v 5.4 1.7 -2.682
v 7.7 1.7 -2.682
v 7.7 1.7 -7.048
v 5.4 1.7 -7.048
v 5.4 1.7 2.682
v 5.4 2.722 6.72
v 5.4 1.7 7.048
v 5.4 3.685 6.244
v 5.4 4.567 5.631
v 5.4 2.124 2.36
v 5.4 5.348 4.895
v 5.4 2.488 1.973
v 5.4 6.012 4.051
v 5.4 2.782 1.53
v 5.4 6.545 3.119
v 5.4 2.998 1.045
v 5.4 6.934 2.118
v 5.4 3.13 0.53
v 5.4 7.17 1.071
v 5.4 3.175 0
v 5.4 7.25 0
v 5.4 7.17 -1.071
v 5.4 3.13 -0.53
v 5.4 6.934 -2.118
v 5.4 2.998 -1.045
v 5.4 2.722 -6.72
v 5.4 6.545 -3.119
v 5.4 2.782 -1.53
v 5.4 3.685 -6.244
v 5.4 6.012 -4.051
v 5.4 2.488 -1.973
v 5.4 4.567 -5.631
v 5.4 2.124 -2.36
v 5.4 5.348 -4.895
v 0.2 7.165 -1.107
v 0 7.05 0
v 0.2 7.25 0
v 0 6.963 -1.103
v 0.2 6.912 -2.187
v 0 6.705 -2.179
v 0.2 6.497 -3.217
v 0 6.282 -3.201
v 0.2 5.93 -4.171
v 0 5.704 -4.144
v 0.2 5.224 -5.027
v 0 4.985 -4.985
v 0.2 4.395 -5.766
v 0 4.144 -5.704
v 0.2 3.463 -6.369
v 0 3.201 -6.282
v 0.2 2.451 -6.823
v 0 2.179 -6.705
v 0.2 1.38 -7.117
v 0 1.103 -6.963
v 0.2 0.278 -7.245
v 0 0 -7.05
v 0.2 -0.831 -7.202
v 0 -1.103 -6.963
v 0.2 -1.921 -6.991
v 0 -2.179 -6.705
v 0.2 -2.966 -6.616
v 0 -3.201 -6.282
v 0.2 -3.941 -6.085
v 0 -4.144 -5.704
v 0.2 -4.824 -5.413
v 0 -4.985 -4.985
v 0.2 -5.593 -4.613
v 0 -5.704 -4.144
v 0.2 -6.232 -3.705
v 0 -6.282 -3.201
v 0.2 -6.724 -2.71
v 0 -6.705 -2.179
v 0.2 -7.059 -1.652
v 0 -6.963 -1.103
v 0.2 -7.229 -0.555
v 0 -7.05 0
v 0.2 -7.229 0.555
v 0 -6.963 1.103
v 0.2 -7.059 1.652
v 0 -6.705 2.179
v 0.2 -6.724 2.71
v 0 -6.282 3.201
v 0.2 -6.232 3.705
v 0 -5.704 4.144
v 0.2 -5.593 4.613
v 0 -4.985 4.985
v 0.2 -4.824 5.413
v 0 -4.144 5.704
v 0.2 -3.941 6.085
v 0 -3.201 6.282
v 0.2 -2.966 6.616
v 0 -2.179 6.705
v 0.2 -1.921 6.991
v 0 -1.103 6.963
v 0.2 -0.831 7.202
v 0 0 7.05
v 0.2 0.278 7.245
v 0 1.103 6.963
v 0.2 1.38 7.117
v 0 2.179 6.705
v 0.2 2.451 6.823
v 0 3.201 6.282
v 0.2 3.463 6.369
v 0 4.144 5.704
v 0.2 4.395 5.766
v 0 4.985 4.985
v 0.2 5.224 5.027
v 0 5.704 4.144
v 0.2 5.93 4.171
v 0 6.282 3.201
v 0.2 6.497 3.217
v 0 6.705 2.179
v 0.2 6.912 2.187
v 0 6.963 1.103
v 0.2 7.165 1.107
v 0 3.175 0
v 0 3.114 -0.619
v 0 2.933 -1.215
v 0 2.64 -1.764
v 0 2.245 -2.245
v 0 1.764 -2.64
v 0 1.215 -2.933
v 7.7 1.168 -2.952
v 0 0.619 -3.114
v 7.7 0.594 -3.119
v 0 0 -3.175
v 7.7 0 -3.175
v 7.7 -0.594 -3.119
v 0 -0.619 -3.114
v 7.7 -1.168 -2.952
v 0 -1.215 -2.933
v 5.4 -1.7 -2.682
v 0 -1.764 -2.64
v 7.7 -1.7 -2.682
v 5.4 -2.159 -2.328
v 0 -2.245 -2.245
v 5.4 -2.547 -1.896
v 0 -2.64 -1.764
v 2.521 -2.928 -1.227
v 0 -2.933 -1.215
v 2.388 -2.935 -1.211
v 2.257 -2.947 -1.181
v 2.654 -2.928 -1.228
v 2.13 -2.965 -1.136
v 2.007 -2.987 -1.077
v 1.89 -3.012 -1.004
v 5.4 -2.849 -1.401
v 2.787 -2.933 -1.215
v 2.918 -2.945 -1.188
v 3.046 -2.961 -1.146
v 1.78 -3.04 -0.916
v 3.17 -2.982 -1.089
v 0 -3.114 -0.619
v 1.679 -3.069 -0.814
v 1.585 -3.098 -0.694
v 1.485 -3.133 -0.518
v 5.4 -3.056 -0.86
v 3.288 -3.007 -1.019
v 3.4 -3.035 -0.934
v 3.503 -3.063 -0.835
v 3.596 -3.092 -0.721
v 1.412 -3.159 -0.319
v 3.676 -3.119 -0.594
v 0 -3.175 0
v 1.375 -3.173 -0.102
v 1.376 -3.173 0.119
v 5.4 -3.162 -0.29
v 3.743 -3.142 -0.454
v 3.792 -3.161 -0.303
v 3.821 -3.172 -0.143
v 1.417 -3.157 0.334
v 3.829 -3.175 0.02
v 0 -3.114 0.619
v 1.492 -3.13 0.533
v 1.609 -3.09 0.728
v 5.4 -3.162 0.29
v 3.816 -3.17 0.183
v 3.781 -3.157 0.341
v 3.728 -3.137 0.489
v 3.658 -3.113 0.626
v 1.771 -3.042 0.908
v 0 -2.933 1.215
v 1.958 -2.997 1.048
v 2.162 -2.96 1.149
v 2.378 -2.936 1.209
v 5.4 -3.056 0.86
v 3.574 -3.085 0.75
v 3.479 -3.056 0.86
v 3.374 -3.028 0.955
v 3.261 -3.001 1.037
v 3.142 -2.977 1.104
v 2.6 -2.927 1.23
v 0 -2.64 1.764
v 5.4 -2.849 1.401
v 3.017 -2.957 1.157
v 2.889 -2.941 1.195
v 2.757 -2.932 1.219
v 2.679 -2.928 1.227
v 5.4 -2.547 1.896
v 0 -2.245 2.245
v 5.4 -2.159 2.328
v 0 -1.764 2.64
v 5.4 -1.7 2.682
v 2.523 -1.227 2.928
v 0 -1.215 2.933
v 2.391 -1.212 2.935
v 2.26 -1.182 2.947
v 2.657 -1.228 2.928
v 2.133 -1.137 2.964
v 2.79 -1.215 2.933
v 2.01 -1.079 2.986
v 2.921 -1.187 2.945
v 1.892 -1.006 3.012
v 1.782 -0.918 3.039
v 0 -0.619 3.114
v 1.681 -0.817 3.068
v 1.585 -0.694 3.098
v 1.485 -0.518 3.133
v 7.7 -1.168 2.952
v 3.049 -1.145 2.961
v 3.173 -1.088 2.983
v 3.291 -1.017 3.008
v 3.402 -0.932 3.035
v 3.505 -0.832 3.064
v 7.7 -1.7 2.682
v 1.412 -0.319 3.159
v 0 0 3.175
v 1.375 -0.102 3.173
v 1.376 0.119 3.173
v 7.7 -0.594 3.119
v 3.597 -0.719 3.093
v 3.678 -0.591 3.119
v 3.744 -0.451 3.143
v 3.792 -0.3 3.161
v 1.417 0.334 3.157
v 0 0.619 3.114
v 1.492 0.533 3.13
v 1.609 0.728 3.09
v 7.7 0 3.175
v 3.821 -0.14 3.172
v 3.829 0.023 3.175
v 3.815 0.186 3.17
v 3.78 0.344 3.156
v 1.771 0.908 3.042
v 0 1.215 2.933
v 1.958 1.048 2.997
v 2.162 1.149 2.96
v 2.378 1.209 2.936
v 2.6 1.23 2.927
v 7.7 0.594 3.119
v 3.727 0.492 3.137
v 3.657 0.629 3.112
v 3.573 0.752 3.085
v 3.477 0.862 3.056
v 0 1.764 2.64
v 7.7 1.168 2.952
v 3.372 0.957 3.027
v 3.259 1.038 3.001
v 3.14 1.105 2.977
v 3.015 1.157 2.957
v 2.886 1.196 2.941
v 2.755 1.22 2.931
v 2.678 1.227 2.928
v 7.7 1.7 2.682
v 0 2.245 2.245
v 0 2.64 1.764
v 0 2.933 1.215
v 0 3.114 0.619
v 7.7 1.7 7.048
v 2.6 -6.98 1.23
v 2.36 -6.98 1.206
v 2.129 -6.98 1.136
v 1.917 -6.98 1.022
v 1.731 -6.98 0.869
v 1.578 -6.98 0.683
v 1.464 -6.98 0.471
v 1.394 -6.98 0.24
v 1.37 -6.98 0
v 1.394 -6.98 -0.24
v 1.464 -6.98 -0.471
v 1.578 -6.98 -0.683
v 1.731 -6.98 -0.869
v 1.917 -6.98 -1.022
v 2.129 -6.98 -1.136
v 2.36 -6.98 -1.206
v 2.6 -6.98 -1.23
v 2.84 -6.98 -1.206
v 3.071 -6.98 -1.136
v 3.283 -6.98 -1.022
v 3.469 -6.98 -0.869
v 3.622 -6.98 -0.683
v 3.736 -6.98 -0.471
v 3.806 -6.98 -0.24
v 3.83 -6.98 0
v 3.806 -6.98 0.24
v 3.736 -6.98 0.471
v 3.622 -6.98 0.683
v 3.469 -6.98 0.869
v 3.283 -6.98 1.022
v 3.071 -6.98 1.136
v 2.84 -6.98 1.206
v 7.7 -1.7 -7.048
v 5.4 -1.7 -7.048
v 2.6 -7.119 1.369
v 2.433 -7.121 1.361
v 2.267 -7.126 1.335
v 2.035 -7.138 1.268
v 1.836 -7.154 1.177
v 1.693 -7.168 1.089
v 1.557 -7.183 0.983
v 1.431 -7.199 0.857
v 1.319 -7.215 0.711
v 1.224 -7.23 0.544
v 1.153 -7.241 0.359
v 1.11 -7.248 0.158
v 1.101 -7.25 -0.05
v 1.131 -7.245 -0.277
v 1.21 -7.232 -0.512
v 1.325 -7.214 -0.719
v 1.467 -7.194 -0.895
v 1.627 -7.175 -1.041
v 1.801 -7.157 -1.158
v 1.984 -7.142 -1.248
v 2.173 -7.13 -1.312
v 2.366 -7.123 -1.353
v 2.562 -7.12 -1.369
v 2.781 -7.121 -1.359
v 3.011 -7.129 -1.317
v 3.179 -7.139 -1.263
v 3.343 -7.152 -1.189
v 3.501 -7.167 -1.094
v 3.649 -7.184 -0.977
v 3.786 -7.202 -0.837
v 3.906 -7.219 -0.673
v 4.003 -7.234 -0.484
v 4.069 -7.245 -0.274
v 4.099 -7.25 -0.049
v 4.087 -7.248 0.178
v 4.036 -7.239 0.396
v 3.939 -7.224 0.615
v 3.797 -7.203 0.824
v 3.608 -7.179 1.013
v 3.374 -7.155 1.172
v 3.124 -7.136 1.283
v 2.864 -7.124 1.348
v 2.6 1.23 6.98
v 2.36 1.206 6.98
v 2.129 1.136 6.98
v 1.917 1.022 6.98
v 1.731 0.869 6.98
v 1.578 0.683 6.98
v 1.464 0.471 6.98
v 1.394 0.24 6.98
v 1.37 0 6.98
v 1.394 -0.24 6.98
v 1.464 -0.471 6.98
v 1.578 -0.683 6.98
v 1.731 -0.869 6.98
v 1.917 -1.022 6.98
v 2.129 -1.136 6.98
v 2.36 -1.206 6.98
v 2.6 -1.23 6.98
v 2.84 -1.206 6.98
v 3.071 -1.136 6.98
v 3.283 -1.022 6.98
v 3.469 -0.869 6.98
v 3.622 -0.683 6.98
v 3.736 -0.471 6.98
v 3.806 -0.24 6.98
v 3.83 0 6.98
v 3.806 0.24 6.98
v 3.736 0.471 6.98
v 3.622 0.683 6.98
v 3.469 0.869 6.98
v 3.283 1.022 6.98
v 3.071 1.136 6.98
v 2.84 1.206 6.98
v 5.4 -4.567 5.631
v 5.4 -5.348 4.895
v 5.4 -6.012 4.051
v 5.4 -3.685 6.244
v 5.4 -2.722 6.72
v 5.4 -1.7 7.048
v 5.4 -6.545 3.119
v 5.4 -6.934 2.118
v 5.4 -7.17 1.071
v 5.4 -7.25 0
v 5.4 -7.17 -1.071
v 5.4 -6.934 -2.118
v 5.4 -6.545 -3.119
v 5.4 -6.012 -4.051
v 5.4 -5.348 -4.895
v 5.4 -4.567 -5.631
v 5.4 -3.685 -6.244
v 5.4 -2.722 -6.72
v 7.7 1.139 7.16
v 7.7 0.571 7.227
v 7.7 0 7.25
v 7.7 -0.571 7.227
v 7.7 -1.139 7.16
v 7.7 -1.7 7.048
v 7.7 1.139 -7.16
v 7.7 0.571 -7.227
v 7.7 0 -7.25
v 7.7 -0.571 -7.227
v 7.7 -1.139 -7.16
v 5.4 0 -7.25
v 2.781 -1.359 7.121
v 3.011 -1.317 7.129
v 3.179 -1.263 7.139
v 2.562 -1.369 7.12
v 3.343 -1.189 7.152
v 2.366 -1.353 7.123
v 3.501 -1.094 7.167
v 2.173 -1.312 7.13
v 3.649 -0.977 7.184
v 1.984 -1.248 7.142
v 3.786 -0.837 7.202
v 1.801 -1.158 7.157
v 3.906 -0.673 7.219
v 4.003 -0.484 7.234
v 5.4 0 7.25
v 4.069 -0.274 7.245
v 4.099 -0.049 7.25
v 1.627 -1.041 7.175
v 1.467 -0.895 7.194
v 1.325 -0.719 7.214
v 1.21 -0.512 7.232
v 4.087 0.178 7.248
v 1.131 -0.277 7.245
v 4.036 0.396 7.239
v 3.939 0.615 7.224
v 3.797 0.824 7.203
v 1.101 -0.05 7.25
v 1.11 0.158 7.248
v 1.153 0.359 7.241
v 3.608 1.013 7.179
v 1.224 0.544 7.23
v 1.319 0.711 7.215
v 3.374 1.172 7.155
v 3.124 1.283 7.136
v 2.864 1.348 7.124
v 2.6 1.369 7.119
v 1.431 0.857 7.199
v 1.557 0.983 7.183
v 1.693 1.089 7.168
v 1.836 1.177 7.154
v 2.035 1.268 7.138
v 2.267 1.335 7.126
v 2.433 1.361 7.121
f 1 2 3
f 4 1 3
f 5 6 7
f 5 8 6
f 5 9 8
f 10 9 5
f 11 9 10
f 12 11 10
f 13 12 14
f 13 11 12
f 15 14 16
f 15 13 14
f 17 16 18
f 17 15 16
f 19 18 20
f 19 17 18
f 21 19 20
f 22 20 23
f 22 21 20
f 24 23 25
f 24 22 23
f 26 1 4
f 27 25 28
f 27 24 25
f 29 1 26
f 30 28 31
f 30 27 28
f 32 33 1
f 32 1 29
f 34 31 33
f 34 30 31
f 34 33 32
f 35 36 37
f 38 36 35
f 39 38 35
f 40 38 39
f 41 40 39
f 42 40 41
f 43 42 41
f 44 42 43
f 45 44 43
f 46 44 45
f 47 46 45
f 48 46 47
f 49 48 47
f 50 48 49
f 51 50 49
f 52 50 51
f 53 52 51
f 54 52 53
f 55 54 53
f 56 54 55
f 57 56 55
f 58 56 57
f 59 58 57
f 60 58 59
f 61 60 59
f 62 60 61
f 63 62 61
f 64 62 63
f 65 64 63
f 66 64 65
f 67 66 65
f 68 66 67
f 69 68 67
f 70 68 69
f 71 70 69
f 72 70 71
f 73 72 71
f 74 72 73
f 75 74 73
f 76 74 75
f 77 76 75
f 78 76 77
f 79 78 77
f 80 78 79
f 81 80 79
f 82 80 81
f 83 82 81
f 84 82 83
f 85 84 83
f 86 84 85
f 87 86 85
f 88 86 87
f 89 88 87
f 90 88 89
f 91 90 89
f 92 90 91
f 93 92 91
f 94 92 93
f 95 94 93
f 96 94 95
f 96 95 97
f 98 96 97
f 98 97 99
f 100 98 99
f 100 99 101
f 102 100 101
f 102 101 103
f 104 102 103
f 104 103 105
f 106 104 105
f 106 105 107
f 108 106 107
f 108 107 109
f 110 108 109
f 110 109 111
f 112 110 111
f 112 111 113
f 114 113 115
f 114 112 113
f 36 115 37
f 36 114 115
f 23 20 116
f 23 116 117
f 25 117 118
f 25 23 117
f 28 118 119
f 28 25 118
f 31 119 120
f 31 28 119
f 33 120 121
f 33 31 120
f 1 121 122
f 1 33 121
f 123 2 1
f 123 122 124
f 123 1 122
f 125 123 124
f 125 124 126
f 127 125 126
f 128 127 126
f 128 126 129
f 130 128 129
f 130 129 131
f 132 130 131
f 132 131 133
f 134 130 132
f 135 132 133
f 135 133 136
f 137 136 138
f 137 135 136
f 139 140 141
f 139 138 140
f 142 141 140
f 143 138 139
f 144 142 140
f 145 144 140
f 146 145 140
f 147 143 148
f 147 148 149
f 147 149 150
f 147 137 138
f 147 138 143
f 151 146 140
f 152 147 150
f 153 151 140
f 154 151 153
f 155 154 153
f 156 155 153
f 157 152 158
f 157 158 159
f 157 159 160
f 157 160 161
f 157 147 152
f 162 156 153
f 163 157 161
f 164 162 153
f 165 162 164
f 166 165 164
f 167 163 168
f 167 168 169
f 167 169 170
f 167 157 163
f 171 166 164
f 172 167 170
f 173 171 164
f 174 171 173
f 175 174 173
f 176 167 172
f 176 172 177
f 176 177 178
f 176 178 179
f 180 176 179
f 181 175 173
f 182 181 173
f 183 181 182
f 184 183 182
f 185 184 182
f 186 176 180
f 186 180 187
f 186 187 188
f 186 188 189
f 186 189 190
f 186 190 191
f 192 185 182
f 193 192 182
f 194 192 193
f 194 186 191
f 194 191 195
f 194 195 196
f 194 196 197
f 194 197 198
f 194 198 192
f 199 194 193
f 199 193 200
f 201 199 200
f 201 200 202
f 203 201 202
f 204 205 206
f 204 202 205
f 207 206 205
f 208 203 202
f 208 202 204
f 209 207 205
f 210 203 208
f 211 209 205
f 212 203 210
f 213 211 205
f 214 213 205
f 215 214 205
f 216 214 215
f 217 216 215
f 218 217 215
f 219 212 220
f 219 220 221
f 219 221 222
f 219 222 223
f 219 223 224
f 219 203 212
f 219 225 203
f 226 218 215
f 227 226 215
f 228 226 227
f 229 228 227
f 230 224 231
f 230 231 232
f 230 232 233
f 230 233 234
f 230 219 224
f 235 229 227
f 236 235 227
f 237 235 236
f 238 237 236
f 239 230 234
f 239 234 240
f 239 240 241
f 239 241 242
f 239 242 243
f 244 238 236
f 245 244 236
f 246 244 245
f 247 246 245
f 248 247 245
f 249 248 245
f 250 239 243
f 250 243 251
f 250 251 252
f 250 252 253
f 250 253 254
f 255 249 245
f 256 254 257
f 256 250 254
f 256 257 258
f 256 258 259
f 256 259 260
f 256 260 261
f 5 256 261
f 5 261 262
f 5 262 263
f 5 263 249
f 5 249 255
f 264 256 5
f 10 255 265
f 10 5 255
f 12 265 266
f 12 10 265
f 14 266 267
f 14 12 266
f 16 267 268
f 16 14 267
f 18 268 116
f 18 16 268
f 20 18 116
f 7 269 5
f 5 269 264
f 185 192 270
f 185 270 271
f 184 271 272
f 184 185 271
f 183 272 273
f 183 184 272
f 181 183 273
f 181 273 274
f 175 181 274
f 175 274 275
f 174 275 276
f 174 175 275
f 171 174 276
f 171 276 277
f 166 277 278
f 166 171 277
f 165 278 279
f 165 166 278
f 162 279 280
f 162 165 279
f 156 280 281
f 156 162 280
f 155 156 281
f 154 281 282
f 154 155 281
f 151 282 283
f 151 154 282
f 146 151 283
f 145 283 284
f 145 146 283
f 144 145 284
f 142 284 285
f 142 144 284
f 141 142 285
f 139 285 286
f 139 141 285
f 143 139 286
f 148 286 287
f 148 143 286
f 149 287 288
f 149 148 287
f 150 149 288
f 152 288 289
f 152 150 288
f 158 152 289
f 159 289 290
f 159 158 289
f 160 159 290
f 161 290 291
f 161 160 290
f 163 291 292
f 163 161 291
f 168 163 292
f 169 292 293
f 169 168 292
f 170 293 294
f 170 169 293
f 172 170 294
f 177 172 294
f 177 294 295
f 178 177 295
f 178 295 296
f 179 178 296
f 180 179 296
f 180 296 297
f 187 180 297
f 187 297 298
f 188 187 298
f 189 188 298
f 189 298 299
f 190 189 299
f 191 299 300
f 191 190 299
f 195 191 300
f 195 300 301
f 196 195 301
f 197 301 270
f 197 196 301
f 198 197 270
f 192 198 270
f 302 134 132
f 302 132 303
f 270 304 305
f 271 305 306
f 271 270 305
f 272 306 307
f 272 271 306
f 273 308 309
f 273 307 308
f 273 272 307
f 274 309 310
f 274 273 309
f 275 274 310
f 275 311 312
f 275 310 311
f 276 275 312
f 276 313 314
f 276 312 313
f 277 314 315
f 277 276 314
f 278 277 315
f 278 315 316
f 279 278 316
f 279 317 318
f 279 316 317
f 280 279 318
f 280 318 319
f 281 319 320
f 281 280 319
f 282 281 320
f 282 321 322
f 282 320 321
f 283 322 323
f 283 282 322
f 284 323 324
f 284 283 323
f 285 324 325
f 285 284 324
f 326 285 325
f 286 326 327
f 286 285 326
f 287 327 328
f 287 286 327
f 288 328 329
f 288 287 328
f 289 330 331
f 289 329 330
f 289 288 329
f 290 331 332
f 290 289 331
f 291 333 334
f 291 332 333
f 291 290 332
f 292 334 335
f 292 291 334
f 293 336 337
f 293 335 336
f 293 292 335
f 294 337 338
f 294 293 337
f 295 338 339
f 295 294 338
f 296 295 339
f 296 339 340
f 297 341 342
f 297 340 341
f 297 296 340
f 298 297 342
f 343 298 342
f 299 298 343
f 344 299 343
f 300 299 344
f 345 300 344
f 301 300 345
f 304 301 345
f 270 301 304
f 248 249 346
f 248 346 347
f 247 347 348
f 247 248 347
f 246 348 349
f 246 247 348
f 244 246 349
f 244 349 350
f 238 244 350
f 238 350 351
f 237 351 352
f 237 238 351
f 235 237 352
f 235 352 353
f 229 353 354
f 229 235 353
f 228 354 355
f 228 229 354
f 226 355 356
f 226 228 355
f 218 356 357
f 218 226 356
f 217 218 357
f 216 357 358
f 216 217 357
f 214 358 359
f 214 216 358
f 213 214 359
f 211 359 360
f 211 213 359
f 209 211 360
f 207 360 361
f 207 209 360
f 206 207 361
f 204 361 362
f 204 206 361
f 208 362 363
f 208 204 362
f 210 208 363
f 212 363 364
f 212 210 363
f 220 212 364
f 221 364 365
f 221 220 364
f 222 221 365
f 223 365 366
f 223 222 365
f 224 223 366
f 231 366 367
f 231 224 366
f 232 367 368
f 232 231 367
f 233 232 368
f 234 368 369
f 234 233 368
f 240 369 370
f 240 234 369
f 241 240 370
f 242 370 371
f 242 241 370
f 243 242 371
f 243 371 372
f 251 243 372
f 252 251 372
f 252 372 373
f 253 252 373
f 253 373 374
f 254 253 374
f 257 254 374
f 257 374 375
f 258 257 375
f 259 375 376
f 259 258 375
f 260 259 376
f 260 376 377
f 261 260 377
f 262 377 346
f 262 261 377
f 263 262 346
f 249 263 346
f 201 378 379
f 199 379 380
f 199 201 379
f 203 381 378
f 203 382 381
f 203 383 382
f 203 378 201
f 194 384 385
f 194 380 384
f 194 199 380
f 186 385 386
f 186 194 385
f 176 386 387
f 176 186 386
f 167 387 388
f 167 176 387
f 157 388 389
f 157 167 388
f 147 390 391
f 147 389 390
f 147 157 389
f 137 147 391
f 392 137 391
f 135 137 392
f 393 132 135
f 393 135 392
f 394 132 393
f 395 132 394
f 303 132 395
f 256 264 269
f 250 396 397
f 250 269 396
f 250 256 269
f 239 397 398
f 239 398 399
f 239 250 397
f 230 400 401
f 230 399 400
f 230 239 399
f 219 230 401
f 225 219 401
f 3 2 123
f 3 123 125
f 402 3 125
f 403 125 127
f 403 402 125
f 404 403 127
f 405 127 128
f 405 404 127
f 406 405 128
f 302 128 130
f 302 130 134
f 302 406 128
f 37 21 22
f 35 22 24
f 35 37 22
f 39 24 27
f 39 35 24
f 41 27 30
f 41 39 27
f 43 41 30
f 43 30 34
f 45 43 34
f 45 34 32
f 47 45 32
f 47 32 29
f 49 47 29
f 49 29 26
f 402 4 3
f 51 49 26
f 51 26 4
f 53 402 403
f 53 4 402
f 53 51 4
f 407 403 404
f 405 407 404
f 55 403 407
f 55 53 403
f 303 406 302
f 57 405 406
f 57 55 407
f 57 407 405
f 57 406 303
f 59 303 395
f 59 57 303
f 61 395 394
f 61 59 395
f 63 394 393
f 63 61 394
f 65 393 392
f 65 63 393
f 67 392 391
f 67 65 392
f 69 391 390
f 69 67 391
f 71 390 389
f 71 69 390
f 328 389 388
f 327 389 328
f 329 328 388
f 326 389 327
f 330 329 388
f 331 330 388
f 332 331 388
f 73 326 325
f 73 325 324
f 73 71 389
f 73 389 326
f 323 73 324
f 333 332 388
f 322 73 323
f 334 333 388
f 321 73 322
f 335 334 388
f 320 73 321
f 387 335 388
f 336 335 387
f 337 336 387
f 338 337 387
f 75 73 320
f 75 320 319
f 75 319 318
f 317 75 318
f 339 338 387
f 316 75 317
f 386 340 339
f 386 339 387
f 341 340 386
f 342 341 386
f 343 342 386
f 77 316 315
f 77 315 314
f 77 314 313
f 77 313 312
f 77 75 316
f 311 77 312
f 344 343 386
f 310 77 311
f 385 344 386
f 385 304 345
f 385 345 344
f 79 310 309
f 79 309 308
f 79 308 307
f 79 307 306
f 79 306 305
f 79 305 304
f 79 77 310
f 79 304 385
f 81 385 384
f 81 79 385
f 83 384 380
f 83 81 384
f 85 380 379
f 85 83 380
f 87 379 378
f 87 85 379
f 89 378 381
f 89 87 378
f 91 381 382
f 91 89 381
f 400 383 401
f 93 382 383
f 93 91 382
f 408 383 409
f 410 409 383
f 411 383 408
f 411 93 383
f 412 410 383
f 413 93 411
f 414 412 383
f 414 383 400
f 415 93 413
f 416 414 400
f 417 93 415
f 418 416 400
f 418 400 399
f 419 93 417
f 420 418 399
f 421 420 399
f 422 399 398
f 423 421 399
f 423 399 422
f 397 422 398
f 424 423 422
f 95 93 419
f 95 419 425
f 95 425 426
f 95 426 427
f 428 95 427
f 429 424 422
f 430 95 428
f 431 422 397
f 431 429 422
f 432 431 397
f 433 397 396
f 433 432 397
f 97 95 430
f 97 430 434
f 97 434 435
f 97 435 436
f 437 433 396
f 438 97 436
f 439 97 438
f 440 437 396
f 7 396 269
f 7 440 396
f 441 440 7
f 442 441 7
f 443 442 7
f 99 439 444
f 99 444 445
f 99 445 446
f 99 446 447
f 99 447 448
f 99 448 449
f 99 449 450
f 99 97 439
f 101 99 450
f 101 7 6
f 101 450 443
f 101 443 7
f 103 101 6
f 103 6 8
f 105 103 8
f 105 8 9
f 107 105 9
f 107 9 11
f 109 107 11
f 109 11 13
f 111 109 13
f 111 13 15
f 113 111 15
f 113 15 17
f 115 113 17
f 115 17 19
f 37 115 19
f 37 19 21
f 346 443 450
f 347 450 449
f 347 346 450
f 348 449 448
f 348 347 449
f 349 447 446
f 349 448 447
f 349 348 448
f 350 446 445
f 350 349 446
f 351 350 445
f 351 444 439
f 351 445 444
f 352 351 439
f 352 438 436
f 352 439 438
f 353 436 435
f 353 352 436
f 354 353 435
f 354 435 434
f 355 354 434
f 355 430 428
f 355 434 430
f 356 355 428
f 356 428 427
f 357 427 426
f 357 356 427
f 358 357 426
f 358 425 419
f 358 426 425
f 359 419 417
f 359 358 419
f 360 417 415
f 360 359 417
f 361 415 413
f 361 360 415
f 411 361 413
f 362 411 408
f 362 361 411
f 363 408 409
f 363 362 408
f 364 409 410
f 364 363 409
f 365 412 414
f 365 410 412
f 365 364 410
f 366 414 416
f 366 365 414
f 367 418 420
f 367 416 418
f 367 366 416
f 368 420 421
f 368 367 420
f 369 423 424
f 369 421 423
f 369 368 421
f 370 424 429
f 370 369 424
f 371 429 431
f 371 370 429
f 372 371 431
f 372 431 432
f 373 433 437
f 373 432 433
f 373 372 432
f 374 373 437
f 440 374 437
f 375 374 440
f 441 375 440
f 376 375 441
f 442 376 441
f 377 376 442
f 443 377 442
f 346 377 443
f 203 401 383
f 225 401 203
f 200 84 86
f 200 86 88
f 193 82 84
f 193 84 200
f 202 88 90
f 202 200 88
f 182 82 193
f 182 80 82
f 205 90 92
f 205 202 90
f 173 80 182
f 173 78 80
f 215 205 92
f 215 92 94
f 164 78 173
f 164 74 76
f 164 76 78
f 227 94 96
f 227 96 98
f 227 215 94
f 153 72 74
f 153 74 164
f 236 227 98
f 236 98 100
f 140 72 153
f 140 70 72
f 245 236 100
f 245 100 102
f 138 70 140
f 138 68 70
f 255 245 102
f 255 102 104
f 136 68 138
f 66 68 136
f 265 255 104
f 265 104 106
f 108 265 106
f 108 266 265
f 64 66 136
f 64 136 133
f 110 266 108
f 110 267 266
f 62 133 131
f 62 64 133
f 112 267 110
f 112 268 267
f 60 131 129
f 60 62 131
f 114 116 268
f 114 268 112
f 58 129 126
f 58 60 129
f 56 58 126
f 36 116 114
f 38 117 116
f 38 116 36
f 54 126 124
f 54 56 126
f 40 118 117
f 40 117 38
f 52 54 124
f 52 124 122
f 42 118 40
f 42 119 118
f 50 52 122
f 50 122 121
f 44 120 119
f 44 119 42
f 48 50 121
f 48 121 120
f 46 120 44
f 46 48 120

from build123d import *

# Parameters (mm, degrees)
SKETCH2_W          = 16.5
SKETCH2_H          = 15.5
SKETCH2_W_2        = 14.5
SKETCH2_H_2        = 3.4
CUT_EXTRUDE1_DEPTH = 2.3


with BuildPart() as part:
    # Sketch1 → Revolve1 (revolve)
    with BuildSketch(Plane.XY):
        Polygon((0, 7.05), (0, 3.175), (7.7, 3.175), (7.7, 7.25), (0.2, 7.25), align=None)
    revolve(axis=Axis((7.7, 0, 0), (-1, 0, 0)))

    # Sketch2 → Cut-Extrude1 (cut)
    with BuildSketch(Plane(origin=(7.7, 0, 0), x_dir=(0, 0, -1), z_dir=(1, 0, 0))):
        Rectangle(SKETCH2_W, SKETCH2_H)
        Rectangle(SKETCH2_W_2, SKETCH2_H_2, mode=Mode.SUBTRACT)
    extrude(amount=-CUT_EXTRUDE1_DEPTH, mode=Mode.SUBTRACT)

    # Sketch3 → Cut-Revolve1 (revolve, cut)
    with BuildSketch(Plane(origin=(2.6, 0, 0), x_dir=(0, 0, -1), z_dir=(1, 0, 0))):
        Polygon((-7.25, 0), (-7.25, 1.5), (-6.9795, 1.2295), (0, 1.2295), (0, 0), align=None)
    revolve(axis=Axis((2.6, 0, 0), (0, 0, 1)), mode=Mode.SUBTRACT)

    # Sketch4 → Cut-Revolve2 (revolve, cut)
    with BuildSketch(Plane(origin=(2.6, 0, 0), x_dir=(0, 0, -1), z_dir=(1, 0, 0))):
        Polygon((0, -7.25), (-1.5, -7.25), (-1.2295, -6.9795), (-1.2295, 0), (0, 0), align=None)
    revolve(axis=Axis((2.6, 0, 0), (0, -1, 0)), mode=Mode.SUBTRACT)


solid = part.part
